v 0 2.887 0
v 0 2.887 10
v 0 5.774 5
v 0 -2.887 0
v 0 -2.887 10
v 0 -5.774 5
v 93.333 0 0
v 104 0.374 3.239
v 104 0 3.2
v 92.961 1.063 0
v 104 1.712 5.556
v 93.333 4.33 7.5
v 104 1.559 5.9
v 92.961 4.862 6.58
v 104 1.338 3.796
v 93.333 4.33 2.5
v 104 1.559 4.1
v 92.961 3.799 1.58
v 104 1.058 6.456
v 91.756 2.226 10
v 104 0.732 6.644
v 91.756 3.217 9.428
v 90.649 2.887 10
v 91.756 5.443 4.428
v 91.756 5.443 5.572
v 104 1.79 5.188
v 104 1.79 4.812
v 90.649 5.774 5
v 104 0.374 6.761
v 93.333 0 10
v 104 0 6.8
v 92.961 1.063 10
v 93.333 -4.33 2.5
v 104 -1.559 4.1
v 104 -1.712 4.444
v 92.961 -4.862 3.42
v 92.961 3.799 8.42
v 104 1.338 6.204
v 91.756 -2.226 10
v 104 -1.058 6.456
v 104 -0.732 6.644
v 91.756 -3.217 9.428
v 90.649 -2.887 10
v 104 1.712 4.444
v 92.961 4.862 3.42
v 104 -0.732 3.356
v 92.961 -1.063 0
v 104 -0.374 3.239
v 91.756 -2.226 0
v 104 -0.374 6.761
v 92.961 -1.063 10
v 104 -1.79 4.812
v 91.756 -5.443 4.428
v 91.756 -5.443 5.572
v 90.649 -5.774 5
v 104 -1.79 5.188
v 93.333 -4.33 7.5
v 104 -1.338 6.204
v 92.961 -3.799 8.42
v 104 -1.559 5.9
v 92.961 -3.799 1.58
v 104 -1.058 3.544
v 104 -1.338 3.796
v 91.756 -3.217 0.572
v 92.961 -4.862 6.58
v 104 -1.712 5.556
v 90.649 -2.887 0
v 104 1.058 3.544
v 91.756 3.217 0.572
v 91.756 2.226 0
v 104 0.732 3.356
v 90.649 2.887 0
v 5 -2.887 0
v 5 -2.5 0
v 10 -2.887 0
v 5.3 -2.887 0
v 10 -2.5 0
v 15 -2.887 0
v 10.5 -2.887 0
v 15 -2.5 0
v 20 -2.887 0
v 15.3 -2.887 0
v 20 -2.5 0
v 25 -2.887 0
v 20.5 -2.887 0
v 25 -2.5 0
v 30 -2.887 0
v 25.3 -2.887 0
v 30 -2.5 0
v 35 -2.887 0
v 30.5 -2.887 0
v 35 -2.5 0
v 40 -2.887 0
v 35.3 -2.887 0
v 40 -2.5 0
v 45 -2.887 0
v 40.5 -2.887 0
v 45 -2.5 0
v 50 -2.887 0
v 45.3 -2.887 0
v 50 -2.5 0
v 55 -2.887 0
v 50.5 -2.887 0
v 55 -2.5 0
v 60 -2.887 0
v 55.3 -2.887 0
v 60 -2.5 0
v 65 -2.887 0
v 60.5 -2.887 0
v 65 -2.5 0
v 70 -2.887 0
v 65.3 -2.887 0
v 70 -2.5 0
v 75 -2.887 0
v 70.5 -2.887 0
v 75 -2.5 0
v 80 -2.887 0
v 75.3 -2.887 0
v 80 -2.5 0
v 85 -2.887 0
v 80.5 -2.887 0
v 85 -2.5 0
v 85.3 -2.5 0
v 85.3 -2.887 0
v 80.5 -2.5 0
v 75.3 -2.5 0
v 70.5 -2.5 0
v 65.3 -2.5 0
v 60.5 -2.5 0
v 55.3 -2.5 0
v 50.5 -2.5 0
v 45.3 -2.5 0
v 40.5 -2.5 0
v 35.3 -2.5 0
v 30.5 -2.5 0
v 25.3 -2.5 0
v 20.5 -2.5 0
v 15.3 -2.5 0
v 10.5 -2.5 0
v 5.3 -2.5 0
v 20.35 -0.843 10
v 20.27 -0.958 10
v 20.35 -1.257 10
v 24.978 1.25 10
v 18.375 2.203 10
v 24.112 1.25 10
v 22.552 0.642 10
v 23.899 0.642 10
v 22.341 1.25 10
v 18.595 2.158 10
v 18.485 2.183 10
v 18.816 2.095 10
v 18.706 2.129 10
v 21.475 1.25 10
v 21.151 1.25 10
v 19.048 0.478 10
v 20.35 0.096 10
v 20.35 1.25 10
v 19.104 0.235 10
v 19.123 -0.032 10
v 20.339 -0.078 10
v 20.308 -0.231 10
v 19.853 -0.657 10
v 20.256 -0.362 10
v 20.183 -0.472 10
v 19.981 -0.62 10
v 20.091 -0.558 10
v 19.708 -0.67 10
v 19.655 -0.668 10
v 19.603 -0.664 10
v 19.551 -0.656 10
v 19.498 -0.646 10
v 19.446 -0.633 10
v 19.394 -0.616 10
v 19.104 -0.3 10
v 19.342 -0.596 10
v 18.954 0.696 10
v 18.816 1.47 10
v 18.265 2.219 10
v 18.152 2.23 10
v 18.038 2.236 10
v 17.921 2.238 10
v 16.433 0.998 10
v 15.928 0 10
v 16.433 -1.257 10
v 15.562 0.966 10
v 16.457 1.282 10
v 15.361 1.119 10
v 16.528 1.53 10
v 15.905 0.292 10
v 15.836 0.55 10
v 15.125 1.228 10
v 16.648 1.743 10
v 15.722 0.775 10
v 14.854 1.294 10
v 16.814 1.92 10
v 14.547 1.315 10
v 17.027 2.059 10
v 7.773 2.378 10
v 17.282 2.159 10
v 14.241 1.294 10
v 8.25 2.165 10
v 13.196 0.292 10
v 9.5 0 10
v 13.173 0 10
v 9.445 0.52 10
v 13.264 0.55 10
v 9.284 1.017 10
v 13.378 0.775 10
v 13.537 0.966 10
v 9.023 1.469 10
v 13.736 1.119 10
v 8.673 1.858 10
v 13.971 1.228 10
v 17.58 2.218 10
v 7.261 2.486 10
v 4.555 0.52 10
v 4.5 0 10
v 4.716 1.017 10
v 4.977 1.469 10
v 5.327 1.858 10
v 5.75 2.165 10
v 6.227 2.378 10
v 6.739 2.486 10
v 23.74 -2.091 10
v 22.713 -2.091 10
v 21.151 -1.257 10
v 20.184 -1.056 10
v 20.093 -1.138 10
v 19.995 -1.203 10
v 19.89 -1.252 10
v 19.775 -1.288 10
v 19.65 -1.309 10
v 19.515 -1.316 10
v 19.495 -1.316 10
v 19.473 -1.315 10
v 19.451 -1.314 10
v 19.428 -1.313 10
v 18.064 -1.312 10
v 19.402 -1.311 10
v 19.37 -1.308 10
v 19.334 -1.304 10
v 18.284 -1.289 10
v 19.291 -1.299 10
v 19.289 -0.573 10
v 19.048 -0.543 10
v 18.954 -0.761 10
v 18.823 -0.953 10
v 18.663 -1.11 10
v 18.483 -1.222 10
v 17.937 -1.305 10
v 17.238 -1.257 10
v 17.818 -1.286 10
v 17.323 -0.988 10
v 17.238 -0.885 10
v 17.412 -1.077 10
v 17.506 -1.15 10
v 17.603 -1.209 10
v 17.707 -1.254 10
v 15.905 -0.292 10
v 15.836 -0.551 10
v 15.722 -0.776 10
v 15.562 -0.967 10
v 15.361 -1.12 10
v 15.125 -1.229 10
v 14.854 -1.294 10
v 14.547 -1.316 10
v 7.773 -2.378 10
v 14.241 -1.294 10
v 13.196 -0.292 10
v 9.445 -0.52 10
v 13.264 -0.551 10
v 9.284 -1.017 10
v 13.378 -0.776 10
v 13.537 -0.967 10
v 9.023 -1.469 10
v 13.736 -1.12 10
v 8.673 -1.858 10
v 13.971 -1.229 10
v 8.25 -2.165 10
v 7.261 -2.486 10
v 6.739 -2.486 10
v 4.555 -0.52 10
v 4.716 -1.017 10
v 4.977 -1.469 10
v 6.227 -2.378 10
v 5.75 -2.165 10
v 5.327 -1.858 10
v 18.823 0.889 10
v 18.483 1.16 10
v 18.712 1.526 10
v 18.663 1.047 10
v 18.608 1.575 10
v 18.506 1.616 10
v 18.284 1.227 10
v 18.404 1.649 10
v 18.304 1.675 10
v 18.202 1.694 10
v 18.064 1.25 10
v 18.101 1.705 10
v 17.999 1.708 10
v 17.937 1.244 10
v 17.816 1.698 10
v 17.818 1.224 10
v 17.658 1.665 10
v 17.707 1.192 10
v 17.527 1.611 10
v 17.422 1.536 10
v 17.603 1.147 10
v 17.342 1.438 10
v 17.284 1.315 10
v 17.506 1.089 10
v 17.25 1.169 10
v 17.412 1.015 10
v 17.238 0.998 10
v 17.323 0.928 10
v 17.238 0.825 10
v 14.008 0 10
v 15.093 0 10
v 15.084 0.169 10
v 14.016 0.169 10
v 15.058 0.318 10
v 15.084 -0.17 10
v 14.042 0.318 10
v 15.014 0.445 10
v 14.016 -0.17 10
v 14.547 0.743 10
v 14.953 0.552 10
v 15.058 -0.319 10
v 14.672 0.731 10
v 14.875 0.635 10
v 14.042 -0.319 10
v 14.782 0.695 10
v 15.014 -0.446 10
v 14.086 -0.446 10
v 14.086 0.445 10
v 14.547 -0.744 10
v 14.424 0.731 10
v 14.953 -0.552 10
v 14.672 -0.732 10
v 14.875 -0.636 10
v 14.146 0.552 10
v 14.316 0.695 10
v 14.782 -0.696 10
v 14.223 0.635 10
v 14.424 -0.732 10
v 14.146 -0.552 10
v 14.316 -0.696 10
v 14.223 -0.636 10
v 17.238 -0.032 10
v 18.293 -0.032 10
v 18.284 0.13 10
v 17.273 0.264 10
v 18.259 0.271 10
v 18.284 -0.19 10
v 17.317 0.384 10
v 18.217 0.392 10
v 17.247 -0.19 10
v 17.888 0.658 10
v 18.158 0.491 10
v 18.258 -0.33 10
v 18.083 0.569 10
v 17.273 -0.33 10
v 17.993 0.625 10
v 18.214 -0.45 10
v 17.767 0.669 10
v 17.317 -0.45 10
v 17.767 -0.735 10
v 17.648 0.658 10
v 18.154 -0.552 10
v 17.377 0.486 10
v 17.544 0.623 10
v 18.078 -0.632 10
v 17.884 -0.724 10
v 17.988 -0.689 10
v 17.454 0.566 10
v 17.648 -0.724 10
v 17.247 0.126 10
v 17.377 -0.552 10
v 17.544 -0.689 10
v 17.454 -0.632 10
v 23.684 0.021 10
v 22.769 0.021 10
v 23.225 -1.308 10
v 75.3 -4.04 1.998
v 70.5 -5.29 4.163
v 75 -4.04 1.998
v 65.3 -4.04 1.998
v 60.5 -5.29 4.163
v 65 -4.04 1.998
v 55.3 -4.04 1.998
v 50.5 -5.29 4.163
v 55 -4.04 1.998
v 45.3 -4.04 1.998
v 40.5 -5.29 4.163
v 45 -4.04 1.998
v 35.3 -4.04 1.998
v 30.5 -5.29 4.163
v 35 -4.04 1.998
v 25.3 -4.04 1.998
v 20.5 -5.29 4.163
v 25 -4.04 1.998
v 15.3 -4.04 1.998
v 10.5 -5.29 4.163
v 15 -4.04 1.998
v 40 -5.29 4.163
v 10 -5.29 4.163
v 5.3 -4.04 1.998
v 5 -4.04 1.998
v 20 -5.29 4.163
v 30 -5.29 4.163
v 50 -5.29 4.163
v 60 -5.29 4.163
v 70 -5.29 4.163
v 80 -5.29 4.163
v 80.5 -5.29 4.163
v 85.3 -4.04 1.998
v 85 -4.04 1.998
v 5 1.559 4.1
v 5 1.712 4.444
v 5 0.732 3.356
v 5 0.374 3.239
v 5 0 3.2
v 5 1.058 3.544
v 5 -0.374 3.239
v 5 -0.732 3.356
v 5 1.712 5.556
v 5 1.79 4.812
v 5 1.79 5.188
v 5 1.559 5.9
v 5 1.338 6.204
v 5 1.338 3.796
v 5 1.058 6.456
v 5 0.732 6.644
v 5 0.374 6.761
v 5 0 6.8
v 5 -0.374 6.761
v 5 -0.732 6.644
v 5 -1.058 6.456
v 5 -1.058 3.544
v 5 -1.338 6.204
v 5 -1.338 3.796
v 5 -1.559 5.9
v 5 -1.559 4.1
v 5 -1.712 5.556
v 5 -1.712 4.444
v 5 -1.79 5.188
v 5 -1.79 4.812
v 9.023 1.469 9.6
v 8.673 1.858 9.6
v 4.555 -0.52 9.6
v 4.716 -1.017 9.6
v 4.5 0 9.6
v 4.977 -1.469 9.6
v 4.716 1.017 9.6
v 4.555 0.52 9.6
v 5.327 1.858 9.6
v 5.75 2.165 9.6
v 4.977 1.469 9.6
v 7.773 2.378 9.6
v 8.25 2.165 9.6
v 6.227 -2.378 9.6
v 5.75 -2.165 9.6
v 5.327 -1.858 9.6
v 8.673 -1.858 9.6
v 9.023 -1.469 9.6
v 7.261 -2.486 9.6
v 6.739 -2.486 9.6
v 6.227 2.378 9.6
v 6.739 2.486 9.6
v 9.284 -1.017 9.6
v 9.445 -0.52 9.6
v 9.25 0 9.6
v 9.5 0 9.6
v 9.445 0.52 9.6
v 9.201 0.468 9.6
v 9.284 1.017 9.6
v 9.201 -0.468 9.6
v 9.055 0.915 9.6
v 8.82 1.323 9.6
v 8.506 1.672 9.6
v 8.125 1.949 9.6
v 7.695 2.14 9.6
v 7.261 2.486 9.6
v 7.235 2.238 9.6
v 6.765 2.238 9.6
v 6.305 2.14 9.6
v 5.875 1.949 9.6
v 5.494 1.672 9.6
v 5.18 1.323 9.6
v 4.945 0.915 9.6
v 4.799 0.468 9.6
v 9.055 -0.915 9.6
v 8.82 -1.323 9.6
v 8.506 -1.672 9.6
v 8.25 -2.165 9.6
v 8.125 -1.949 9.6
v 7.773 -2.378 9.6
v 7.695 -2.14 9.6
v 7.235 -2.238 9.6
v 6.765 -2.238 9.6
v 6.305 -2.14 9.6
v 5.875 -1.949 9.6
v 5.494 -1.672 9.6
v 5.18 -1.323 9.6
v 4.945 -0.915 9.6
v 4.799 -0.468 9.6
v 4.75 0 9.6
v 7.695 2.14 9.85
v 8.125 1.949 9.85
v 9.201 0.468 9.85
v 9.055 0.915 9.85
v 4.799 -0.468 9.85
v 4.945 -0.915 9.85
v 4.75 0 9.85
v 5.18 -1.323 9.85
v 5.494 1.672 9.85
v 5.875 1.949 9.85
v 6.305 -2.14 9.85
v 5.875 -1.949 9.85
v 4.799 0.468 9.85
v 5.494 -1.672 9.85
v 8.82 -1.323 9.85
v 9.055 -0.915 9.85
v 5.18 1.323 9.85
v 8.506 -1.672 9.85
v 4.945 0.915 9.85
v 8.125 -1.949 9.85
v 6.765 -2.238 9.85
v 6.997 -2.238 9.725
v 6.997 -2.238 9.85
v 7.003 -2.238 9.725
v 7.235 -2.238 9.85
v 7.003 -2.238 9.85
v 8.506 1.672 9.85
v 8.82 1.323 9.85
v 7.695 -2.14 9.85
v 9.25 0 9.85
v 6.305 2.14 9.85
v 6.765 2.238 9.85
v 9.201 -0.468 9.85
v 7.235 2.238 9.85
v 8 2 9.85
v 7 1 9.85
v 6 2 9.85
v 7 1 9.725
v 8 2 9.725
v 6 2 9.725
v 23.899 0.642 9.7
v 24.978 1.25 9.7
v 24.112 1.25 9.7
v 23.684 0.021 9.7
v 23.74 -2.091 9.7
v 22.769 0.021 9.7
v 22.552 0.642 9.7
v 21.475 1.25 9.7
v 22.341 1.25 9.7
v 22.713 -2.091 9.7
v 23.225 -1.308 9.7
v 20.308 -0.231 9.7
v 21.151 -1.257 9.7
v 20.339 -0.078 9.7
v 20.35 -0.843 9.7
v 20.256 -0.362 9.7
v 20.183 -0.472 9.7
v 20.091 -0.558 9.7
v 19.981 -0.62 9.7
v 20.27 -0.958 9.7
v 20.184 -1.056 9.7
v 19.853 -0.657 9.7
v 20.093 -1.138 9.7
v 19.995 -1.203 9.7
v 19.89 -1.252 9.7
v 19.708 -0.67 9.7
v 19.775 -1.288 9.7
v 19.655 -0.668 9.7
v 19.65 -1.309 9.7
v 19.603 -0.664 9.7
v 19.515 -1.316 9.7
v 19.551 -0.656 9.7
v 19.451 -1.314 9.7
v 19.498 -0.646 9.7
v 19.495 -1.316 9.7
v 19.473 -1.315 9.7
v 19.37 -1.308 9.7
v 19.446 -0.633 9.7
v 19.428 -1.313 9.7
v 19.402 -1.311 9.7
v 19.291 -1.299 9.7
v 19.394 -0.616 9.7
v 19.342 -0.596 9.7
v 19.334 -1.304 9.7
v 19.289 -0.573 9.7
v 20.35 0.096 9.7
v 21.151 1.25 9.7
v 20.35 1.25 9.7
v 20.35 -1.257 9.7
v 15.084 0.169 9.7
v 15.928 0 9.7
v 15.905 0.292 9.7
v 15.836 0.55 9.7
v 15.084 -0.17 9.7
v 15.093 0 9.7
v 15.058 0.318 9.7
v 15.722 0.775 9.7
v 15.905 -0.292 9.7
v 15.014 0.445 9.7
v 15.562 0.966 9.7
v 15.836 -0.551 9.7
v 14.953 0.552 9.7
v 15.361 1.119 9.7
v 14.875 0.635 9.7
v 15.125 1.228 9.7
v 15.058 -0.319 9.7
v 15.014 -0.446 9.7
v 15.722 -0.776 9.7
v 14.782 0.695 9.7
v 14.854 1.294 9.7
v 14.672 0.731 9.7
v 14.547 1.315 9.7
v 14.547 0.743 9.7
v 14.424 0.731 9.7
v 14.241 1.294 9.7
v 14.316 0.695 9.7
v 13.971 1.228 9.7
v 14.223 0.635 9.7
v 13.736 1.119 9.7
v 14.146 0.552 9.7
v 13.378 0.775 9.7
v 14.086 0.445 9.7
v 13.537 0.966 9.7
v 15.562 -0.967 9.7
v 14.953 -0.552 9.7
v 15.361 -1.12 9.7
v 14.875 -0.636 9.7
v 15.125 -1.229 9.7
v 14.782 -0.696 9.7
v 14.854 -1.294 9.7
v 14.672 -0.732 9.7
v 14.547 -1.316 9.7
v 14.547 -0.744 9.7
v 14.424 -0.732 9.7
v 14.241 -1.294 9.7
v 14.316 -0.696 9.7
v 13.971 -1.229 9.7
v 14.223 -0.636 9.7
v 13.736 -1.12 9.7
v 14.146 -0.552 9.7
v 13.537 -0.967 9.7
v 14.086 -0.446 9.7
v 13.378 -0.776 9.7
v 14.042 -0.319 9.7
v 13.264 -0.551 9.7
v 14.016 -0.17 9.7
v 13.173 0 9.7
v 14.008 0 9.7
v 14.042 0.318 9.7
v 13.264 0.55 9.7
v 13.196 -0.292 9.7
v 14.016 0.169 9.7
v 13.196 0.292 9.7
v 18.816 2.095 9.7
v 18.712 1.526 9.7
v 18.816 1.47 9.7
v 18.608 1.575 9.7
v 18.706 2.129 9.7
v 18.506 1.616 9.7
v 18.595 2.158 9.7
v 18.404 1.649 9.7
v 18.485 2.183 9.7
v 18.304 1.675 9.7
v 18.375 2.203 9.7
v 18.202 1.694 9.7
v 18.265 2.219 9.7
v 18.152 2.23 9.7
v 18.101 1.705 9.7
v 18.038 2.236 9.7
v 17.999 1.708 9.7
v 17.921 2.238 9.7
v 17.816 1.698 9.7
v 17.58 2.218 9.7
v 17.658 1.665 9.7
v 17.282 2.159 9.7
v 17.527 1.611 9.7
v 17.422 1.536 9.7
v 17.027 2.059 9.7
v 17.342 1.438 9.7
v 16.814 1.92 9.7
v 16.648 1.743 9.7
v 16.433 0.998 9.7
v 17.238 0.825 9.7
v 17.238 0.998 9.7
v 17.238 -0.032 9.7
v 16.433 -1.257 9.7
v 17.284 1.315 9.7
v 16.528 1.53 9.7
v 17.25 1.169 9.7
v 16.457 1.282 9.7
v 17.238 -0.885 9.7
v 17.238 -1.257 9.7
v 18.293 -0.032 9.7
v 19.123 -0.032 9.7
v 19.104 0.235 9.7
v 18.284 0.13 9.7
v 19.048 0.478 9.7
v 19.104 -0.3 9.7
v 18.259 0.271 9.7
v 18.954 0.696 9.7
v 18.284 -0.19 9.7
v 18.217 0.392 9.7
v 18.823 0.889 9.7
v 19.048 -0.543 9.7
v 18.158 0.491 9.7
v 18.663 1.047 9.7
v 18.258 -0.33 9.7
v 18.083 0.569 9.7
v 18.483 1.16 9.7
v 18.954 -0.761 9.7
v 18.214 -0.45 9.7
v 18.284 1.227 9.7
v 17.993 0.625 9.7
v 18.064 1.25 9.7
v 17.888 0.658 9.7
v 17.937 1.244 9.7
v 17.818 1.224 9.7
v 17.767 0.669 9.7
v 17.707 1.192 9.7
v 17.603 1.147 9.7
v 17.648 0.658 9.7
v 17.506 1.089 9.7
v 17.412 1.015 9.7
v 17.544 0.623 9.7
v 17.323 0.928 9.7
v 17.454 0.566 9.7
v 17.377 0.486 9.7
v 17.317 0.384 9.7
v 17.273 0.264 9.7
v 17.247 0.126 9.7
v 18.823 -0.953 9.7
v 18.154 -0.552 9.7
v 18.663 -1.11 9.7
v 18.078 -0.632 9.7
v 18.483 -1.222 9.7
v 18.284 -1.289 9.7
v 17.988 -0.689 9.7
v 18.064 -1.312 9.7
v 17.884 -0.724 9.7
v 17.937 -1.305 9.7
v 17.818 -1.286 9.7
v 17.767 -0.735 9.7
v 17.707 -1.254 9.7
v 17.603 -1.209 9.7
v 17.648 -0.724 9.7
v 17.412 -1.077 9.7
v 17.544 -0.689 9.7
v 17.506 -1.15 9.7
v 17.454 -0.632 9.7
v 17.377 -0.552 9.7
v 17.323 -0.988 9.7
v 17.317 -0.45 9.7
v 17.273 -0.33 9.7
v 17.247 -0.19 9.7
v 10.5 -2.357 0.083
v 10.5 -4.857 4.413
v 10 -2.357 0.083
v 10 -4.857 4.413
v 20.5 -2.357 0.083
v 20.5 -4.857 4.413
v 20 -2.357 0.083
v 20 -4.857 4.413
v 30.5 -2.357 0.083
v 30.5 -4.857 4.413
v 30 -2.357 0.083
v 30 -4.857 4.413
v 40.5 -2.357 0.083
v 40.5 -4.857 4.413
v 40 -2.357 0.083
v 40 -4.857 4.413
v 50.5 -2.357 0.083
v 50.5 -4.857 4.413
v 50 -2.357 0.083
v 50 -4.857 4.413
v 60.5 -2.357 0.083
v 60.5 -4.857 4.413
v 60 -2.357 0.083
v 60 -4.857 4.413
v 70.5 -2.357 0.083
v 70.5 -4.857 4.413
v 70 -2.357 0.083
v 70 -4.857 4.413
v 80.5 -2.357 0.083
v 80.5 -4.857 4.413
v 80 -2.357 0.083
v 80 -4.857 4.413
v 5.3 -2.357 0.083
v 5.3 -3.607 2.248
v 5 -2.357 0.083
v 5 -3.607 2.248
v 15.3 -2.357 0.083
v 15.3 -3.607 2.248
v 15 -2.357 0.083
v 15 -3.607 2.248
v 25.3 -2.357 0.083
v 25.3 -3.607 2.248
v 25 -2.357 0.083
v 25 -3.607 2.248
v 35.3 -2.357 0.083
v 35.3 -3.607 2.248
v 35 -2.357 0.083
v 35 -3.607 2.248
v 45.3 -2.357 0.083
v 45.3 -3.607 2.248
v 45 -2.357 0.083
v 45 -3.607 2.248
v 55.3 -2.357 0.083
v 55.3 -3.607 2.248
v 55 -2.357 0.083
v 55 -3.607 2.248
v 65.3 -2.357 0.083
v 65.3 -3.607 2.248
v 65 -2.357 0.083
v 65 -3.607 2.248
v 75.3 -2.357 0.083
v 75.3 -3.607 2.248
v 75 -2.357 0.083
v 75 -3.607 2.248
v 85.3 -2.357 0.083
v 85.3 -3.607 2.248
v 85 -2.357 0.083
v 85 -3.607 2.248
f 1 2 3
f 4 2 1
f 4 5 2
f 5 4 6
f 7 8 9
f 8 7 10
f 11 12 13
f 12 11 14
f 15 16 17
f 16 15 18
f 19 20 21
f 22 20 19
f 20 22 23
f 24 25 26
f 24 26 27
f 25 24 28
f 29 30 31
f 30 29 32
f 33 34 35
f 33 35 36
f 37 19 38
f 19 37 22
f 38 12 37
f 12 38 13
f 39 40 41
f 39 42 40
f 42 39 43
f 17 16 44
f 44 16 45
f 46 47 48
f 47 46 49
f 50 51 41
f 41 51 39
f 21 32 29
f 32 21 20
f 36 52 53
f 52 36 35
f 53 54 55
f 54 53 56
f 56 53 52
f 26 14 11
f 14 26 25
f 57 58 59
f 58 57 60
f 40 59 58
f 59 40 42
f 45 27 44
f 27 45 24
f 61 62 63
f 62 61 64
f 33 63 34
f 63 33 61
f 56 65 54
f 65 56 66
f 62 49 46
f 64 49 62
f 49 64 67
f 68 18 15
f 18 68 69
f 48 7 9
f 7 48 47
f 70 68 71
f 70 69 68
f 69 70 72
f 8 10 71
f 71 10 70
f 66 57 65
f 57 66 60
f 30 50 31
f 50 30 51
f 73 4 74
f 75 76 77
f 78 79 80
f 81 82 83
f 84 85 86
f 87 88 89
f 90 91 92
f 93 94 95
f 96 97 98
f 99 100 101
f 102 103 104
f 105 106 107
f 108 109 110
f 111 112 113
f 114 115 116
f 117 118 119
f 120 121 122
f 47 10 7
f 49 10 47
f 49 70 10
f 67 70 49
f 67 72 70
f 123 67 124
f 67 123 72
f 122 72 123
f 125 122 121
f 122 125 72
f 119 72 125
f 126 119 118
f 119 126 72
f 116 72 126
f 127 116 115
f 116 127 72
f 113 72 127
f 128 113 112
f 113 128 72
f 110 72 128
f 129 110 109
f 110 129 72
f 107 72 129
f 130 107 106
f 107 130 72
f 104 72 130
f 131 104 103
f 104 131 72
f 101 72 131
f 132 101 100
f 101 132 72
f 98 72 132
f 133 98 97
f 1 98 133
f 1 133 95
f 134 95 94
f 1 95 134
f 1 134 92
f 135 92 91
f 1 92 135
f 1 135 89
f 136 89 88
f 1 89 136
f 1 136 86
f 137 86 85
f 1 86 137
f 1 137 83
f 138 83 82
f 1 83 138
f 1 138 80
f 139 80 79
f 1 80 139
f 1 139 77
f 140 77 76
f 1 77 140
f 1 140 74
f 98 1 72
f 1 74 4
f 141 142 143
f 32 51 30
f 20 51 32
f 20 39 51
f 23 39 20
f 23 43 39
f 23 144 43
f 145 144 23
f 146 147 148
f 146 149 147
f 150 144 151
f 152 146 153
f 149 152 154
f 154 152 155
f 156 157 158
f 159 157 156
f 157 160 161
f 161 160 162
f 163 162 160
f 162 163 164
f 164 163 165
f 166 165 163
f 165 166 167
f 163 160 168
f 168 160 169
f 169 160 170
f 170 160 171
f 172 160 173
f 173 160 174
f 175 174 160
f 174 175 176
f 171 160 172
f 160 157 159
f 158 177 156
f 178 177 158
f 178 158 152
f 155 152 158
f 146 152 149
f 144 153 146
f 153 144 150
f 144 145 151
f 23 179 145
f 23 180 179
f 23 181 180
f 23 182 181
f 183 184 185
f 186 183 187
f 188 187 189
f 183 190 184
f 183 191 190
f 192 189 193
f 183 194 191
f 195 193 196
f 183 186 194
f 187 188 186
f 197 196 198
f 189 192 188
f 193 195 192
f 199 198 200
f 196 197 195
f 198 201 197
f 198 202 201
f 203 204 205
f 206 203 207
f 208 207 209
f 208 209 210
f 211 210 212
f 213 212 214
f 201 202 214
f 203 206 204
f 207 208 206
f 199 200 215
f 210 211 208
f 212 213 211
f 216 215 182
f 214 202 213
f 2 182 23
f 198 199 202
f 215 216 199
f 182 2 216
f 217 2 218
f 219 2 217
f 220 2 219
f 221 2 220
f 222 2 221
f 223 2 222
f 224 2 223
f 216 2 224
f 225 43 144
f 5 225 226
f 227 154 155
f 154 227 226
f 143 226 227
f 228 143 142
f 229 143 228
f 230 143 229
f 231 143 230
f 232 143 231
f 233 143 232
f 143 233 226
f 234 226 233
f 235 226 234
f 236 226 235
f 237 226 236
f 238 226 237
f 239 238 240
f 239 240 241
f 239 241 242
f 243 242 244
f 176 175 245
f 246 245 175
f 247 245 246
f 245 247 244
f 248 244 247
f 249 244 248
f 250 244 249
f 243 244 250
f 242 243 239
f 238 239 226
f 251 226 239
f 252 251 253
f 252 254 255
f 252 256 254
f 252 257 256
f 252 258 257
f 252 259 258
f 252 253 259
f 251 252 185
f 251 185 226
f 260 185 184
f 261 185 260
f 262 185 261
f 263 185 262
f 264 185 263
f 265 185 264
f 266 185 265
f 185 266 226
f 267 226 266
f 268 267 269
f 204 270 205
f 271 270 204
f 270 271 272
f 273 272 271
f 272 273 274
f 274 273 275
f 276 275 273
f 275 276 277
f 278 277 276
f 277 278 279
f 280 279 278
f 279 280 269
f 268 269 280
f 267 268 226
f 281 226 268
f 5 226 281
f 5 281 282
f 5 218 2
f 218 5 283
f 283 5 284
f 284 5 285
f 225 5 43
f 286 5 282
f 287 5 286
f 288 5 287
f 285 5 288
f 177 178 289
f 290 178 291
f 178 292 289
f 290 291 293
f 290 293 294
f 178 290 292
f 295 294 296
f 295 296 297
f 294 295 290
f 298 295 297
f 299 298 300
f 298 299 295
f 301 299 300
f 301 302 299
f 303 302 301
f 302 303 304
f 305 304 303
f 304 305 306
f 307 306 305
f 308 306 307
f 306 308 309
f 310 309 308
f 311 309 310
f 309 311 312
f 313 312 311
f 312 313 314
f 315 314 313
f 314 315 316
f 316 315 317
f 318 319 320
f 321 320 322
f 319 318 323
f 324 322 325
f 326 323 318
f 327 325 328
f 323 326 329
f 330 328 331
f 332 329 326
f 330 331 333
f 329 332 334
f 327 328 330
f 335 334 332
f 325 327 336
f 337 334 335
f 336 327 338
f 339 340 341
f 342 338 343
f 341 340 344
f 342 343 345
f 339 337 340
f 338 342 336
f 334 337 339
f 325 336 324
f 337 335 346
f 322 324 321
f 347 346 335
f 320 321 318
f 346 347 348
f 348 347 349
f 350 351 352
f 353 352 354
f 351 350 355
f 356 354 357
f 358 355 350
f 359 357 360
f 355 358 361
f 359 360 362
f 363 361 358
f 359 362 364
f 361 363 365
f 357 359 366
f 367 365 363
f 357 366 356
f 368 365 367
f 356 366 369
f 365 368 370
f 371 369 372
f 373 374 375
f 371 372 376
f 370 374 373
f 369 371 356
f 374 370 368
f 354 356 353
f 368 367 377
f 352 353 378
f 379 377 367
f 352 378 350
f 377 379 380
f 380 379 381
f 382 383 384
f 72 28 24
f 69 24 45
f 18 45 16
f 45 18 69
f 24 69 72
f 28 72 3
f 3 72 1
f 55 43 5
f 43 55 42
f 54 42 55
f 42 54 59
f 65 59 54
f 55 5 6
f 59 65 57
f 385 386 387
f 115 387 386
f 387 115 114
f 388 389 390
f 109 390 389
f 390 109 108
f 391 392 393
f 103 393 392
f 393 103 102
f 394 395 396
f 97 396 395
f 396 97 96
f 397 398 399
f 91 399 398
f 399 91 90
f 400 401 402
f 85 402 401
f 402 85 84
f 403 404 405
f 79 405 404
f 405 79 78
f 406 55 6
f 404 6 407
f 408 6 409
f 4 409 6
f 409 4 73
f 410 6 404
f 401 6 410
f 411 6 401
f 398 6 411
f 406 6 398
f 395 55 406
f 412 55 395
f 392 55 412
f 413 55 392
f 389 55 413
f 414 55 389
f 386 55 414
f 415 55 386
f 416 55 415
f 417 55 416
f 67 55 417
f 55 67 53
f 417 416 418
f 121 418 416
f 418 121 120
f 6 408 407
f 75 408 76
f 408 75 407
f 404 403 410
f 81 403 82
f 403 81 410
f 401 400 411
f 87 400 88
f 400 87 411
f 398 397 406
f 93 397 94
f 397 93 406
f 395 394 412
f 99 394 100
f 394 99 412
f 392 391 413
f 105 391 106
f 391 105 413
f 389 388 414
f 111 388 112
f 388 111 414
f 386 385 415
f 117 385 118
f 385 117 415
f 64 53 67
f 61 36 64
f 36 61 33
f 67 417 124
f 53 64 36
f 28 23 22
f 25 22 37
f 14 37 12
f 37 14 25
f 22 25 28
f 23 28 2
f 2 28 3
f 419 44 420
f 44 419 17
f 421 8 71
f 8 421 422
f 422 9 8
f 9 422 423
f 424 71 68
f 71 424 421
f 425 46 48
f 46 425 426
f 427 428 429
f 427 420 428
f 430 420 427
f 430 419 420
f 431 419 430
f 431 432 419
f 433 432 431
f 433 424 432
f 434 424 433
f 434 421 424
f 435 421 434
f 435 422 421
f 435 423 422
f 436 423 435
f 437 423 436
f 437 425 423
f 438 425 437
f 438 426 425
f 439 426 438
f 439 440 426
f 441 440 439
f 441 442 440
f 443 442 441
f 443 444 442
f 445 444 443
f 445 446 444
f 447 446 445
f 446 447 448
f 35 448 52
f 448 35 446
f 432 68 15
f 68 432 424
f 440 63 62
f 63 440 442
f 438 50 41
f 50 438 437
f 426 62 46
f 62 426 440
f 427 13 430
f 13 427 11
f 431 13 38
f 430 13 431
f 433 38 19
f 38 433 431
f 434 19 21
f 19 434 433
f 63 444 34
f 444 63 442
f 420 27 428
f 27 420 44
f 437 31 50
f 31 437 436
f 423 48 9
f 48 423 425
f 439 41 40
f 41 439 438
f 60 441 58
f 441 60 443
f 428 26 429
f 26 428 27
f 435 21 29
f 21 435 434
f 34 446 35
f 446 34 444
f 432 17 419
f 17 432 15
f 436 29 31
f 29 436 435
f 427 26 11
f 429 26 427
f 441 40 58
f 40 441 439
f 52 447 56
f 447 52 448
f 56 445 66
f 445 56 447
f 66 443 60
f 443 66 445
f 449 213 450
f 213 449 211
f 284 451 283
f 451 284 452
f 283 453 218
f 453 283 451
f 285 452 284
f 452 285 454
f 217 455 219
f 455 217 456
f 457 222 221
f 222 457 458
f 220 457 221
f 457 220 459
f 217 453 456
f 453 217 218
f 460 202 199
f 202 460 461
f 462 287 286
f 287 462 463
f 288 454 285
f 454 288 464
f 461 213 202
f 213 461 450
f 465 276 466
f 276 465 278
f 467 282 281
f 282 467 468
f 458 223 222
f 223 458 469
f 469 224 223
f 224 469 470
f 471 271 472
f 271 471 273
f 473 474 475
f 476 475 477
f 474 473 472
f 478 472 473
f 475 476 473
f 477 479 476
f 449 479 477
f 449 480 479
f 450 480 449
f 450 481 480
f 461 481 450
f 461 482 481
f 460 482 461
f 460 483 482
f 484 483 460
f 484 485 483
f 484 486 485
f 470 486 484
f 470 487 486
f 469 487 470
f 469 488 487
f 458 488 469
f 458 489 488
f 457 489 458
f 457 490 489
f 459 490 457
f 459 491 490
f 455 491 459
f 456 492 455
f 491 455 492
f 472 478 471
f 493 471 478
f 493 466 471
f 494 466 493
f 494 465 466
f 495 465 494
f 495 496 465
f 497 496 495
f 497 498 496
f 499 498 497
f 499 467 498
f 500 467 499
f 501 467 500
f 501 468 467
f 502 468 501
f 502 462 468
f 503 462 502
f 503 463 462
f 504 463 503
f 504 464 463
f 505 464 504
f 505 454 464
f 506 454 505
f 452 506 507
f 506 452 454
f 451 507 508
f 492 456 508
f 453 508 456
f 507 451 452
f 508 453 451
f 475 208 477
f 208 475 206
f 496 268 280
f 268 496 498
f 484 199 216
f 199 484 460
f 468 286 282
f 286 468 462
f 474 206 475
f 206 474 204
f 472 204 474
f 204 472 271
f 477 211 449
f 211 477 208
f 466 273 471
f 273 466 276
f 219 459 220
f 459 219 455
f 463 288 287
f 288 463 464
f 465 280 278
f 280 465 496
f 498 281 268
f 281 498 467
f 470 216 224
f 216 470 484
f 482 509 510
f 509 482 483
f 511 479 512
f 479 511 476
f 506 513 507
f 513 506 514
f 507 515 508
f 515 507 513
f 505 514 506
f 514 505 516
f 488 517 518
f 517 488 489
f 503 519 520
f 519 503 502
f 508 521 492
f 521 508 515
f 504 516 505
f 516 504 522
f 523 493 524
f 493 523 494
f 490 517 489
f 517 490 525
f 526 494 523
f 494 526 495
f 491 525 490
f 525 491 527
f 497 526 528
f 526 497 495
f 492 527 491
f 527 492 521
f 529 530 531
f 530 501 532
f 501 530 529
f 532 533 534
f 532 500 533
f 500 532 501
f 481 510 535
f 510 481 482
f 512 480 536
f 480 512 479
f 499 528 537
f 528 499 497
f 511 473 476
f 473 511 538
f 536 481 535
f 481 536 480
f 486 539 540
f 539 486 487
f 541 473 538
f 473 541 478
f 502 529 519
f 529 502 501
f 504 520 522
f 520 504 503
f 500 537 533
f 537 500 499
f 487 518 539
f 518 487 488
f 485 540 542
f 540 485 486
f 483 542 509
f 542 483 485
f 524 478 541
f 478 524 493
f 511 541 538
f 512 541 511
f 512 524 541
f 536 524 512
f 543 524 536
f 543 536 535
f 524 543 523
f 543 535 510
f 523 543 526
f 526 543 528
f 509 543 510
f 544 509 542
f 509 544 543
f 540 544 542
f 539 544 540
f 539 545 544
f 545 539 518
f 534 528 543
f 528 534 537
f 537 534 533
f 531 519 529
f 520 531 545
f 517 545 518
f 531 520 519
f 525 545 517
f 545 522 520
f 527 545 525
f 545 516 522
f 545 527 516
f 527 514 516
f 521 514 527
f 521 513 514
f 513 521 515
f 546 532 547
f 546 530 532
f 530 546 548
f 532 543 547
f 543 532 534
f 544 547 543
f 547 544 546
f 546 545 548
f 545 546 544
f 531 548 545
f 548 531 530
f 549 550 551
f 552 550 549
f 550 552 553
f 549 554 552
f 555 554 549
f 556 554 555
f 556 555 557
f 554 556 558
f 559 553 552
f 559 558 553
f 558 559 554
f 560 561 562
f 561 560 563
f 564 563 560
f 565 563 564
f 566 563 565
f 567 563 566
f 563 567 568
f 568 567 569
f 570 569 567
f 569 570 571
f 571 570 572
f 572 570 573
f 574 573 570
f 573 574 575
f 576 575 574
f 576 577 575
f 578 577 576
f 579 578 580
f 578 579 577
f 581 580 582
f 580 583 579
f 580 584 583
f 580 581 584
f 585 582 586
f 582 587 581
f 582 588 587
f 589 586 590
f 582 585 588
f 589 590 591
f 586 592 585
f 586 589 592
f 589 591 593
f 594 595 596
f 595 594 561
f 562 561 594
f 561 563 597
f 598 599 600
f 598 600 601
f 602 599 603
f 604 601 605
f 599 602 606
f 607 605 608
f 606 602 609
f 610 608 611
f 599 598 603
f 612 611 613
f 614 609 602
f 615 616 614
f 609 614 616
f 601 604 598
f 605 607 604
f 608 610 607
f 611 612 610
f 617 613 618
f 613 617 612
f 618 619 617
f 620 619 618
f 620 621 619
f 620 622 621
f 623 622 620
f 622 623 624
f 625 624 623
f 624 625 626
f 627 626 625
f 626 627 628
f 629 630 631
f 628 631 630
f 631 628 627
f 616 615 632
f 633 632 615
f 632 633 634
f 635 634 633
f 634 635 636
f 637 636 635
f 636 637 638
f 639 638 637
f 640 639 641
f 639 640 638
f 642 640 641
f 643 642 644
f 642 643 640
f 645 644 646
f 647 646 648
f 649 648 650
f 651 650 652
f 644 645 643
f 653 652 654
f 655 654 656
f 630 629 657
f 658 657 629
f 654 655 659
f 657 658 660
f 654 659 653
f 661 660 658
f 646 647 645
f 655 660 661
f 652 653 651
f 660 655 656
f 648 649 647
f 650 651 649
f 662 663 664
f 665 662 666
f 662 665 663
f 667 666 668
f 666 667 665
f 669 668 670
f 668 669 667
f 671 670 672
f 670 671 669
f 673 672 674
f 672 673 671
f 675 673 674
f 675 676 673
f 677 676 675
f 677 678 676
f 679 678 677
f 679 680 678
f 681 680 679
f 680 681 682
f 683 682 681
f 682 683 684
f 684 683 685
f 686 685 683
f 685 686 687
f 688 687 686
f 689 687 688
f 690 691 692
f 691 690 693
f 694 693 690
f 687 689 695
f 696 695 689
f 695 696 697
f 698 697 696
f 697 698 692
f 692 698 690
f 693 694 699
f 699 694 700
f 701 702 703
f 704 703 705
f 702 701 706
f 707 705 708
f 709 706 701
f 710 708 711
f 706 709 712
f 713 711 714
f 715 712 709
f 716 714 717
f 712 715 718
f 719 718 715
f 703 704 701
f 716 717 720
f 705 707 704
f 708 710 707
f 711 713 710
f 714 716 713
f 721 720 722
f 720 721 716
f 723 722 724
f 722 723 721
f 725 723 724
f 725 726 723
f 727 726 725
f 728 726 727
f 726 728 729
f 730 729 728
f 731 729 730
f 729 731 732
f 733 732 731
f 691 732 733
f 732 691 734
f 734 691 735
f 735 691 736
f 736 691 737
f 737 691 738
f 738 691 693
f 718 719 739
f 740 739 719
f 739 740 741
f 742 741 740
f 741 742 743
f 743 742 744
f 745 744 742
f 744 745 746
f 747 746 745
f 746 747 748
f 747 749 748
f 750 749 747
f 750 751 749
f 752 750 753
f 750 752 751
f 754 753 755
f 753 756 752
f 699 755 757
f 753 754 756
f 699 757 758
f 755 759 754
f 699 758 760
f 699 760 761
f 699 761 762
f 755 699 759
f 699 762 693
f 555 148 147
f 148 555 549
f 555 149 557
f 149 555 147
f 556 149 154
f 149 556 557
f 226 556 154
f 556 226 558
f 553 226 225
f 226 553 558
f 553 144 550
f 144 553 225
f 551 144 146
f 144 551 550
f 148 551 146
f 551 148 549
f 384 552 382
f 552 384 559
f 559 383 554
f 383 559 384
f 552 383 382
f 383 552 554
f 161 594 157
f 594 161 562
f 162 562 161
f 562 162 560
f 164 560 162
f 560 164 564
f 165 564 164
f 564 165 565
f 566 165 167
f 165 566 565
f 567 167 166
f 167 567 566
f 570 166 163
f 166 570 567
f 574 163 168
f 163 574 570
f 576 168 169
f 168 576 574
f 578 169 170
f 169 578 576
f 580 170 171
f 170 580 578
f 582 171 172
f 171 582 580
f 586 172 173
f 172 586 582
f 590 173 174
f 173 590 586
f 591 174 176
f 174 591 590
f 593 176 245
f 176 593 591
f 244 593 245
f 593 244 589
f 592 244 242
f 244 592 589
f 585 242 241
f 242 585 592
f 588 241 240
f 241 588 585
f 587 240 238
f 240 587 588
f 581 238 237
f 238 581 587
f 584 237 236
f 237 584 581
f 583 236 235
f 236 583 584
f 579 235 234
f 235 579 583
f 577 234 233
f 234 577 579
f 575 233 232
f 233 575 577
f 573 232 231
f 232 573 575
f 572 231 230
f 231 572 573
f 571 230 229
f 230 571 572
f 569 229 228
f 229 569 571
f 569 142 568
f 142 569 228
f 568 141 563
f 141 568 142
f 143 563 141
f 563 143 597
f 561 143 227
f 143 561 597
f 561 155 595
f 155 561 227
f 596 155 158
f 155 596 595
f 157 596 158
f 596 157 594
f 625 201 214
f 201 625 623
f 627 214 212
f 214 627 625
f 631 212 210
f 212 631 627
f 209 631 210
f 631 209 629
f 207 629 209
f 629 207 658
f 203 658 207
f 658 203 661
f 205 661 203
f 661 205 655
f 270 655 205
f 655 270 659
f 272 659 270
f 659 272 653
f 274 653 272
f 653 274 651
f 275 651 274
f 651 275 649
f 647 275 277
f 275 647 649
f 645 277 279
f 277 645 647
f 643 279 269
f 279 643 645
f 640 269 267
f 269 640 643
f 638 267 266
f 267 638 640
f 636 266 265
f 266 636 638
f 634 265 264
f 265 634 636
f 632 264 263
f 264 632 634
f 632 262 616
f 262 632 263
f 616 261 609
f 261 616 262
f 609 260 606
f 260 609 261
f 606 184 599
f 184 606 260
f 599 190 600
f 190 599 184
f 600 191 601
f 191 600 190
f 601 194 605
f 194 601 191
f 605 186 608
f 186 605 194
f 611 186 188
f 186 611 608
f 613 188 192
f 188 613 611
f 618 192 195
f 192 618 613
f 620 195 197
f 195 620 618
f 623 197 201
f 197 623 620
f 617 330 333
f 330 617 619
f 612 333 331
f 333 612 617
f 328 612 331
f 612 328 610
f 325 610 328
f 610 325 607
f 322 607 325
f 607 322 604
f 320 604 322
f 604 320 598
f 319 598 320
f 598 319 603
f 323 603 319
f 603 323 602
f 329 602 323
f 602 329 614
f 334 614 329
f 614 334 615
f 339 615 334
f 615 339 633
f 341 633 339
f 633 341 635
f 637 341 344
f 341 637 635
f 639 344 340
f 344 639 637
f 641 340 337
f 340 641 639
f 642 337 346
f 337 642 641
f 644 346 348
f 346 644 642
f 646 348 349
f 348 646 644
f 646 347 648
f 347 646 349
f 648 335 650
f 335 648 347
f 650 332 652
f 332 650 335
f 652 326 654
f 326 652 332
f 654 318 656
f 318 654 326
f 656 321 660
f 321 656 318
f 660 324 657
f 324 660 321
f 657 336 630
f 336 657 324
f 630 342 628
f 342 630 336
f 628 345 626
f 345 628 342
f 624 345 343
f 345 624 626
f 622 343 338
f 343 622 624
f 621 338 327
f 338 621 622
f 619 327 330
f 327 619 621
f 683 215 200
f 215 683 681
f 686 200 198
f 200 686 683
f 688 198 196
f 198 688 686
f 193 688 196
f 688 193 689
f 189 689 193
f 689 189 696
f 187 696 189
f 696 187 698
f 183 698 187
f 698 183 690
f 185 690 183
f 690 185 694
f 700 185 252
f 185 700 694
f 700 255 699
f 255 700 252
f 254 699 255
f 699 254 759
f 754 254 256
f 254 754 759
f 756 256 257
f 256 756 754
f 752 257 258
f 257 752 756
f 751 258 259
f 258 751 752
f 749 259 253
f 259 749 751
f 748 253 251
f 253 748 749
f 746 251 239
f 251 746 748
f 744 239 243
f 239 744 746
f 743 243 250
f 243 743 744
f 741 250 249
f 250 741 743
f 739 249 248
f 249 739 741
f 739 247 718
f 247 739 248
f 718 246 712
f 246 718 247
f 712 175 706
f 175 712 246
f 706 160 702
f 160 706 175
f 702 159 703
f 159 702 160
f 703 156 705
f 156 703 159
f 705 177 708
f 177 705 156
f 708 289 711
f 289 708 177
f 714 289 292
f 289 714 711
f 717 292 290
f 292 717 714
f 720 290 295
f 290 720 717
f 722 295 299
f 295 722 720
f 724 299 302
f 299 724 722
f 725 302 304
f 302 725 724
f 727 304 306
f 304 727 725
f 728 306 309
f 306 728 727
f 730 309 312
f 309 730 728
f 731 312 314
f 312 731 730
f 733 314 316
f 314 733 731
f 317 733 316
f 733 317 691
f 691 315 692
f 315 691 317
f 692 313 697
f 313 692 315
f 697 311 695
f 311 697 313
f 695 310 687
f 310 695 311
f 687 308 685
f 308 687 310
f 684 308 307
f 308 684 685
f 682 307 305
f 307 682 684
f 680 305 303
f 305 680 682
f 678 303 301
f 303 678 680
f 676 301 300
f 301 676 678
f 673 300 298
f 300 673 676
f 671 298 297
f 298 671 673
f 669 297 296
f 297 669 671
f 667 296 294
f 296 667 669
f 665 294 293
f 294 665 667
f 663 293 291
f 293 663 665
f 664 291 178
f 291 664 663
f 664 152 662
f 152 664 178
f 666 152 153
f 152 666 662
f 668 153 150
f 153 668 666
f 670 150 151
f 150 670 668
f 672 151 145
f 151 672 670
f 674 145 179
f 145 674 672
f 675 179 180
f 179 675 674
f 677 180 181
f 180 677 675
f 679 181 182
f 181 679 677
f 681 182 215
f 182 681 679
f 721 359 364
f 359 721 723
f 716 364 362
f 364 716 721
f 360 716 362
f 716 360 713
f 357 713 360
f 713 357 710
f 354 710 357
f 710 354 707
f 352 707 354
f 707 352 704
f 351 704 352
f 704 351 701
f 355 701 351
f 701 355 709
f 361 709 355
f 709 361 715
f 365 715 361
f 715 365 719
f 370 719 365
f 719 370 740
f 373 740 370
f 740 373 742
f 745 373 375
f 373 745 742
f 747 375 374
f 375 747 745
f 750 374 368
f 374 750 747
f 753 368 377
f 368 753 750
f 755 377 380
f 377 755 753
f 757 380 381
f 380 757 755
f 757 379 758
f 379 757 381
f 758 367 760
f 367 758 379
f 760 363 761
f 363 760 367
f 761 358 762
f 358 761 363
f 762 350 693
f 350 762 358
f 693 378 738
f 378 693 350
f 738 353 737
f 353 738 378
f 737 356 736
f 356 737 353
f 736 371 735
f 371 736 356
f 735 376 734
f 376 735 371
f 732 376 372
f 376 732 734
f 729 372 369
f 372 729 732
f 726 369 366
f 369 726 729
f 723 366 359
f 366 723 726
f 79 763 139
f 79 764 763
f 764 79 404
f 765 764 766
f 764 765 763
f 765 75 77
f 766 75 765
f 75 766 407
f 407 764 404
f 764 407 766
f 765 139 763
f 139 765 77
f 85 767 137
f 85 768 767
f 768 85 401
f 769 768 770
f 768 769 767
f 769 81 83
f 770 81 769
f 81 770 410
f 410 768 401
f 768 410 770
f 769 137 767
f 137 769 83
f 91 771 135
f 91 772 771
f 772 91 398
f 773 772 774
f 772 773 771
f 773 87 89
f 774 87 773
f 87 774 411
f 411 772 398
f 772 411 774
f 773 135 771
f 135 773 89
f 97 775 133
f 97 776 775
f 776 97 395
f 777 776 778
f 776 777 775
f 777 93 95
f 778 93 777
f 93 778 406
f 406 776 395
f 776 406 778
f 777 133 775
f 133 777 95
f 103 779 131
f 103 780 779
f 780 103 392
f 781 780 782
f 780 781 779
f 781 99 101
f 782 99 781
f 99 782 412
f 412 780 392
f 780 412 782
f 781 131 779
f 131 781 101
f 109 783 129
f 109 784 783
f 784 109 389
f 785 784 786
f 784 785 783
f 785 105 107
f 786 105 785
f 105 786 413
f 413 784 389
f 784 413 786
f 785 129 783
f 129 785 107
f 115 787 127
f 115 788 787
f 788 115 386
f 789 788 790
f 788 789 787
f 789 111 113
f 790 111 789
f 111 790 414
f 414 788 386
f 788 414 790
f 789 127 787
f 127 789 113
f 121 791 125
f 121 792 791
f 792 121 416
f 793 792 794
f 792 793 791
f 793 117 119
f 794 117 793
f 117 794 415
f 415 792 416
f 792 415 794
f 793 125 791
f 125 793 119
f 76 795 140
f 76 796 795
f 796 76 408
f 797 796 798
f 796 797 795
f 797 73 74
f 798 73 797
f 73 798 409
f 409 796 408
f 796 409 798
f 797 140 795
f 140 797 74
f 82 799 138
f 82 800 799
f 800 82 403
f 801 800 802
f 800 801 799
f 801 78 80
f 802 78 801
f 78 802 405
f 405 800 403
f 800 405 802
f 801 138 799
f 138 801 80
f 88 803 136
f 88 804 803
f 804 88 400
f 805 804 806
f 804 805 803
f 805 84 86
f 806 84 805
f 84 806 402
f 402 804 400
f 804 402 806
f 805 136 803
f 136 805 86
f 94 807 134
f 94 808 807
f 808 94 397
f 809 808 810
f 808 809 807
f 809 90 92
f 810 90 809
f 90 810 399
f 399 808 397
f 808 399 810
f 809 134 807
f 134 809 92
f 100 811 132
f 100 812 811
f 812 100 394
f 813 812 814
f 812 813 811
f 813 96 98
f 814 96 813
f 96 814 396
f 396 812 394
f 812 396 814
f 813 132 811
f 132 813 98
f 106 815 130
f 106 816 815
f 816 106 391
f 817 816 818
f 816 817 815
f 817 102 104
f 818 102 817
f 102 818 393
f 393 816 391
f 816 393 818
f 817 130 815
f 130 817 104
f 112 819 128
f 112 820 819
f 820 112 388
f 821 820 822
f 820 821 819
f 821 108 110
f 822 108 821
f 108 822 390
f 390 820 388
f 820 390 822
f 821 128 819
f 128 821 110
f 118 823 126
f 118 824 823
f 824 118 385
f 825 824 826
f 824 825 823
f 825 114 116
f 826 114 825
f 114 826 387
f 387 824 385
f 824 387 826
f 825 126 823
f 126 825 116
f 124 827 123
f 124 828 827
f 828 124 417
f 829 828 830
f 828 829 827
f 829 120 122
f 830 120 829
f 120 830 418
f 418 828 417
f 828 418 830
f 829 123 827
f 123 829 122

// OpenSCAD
$fn = 30;

delka = 100;

r=5;

//translate([7,-10,0]) cube([6,20,20]);

rotate([120,00,0]) difference () {
    rotate([120,0,0]) difference() {
rotate([120,0,0]) 
        difference() {
translate([0,0,r]) rotate([0,90,0]) difference() {
    intersection() {
        union() {
            cylinder(h=delka-10, r=r+1);
            translate([0,0,delka-10]) cylinder(h=20, r1=r+1, r2=0);
        }
        translate([0,0,delka/2-1]) Hexagone(cle=2*r,h=delka*2);
        
    }
    translate([0,0,5]) cylinder(h=delka*2, r=1.8);
}
translate([7,0,9.6]) scale(.25) rotate([0,0,180]) Logo();
//translate([7,0,9.7]) scale(2.5) rotate([0,0,180]) Logo();
translate([delka-75,.25*r,2*r-.3]) scale(.33) rotate([0,0,180]) linear_extrude(height = 1) {
    text("Argo", font = "Sans Bold:style=bold");
//text
      // text("Gymnázium, Praha 6, Arabská 14.", font = "Liberation Sans:style=Bold");
//text("G", font = "Liberation Sans:style=Bold");
}
}



translate([delka-45,-0.5* r,.45*r]) scale(.4) rotate([0,0,180]) linear_extrude(height = 1) {
       //text("🎒🛏👞🔦🌧️🐍-🚰🍴", font = "Unifont Upper:style=Bold");
//text("11", font = "Liberation Sans:style=Bold");


}



}
union() {
    for (x=[10:10:delka-15]) translate([x,r*0.25,r*.4]) cube([.5,5,1]);
    for (x=[5:10:delka-15]) translate([x,r*0.25,r*.4]) cube([.3,2.5,1]);
}
}

module Hexagone(cle,h)
{
	angle = 360/6;		// 6 pans
	cote = cle * cot(angle);

	union()
	{
		rotate([0,0,0])
			cube([cle,cote,h],center=true);
		rotate([0,0,angle])
			cube([cle,cote,h],center=true);
		rotate([0,0,2*angle])
			cube([cle,cote,h],center=true);
	}
}


function cot(x)=1/tan(x);

module Logo() {
       union() {
         difference() {
             cylinder(h=10, r=10);
             translate([0,0,-.1]) cylinder(h=10.2, r=9);
         }
         translate([0,0,1]) cylinder(h=10.1, r=9.1);
         translate([0,0,.5]) polyhedron(
         points=[
        [0,9,0], [-4,-8,0], [0,-4,0], [4,-8,0],
        [0,9,10], [-4,-8,10],[0,-4,10],[4,-8,10]
        ],
        faces=[  [0,1,2,3],  // bottom
  [4,5,1,0],  // front
  [7,6,5,4],  // top
  [5,6,2,1],  // right
  [6,7,3,2],  // back
  [7,4,0,3]]); // left
    }
}

module Logo2() {
intersection() {
difference() {
    cylinder(h=1, r=1,center = false);
    translate([0,0,-.5]) cylinder(h=2,r=.8, center=false);
}

translate([-1,-1.5,-.01]) cube([1.6,3,1]);
}

intersection() {
translate([1.25,-.5,0]) difference() {
    cylinder(h=1, r=2,center = false);
    translate([0,0,-.5]) cylinder(h=2,r=1.8, center=false);
}
translate([-1,-1,-.5]) cube([2,2,2]);
}

intersection() {
translate([-1.25,-.5,0]) difference() {
    cylinder(h=1, r=2,center = false);
    translate([0,0,-.5]) cylinder(h=2,r=1.8, center=false);
}

translate([-1,-1,-.5]) cube([2,2,2]);

}

translate([-.6,-.1,0]) cube([1.2,.2,1]);
}
    
